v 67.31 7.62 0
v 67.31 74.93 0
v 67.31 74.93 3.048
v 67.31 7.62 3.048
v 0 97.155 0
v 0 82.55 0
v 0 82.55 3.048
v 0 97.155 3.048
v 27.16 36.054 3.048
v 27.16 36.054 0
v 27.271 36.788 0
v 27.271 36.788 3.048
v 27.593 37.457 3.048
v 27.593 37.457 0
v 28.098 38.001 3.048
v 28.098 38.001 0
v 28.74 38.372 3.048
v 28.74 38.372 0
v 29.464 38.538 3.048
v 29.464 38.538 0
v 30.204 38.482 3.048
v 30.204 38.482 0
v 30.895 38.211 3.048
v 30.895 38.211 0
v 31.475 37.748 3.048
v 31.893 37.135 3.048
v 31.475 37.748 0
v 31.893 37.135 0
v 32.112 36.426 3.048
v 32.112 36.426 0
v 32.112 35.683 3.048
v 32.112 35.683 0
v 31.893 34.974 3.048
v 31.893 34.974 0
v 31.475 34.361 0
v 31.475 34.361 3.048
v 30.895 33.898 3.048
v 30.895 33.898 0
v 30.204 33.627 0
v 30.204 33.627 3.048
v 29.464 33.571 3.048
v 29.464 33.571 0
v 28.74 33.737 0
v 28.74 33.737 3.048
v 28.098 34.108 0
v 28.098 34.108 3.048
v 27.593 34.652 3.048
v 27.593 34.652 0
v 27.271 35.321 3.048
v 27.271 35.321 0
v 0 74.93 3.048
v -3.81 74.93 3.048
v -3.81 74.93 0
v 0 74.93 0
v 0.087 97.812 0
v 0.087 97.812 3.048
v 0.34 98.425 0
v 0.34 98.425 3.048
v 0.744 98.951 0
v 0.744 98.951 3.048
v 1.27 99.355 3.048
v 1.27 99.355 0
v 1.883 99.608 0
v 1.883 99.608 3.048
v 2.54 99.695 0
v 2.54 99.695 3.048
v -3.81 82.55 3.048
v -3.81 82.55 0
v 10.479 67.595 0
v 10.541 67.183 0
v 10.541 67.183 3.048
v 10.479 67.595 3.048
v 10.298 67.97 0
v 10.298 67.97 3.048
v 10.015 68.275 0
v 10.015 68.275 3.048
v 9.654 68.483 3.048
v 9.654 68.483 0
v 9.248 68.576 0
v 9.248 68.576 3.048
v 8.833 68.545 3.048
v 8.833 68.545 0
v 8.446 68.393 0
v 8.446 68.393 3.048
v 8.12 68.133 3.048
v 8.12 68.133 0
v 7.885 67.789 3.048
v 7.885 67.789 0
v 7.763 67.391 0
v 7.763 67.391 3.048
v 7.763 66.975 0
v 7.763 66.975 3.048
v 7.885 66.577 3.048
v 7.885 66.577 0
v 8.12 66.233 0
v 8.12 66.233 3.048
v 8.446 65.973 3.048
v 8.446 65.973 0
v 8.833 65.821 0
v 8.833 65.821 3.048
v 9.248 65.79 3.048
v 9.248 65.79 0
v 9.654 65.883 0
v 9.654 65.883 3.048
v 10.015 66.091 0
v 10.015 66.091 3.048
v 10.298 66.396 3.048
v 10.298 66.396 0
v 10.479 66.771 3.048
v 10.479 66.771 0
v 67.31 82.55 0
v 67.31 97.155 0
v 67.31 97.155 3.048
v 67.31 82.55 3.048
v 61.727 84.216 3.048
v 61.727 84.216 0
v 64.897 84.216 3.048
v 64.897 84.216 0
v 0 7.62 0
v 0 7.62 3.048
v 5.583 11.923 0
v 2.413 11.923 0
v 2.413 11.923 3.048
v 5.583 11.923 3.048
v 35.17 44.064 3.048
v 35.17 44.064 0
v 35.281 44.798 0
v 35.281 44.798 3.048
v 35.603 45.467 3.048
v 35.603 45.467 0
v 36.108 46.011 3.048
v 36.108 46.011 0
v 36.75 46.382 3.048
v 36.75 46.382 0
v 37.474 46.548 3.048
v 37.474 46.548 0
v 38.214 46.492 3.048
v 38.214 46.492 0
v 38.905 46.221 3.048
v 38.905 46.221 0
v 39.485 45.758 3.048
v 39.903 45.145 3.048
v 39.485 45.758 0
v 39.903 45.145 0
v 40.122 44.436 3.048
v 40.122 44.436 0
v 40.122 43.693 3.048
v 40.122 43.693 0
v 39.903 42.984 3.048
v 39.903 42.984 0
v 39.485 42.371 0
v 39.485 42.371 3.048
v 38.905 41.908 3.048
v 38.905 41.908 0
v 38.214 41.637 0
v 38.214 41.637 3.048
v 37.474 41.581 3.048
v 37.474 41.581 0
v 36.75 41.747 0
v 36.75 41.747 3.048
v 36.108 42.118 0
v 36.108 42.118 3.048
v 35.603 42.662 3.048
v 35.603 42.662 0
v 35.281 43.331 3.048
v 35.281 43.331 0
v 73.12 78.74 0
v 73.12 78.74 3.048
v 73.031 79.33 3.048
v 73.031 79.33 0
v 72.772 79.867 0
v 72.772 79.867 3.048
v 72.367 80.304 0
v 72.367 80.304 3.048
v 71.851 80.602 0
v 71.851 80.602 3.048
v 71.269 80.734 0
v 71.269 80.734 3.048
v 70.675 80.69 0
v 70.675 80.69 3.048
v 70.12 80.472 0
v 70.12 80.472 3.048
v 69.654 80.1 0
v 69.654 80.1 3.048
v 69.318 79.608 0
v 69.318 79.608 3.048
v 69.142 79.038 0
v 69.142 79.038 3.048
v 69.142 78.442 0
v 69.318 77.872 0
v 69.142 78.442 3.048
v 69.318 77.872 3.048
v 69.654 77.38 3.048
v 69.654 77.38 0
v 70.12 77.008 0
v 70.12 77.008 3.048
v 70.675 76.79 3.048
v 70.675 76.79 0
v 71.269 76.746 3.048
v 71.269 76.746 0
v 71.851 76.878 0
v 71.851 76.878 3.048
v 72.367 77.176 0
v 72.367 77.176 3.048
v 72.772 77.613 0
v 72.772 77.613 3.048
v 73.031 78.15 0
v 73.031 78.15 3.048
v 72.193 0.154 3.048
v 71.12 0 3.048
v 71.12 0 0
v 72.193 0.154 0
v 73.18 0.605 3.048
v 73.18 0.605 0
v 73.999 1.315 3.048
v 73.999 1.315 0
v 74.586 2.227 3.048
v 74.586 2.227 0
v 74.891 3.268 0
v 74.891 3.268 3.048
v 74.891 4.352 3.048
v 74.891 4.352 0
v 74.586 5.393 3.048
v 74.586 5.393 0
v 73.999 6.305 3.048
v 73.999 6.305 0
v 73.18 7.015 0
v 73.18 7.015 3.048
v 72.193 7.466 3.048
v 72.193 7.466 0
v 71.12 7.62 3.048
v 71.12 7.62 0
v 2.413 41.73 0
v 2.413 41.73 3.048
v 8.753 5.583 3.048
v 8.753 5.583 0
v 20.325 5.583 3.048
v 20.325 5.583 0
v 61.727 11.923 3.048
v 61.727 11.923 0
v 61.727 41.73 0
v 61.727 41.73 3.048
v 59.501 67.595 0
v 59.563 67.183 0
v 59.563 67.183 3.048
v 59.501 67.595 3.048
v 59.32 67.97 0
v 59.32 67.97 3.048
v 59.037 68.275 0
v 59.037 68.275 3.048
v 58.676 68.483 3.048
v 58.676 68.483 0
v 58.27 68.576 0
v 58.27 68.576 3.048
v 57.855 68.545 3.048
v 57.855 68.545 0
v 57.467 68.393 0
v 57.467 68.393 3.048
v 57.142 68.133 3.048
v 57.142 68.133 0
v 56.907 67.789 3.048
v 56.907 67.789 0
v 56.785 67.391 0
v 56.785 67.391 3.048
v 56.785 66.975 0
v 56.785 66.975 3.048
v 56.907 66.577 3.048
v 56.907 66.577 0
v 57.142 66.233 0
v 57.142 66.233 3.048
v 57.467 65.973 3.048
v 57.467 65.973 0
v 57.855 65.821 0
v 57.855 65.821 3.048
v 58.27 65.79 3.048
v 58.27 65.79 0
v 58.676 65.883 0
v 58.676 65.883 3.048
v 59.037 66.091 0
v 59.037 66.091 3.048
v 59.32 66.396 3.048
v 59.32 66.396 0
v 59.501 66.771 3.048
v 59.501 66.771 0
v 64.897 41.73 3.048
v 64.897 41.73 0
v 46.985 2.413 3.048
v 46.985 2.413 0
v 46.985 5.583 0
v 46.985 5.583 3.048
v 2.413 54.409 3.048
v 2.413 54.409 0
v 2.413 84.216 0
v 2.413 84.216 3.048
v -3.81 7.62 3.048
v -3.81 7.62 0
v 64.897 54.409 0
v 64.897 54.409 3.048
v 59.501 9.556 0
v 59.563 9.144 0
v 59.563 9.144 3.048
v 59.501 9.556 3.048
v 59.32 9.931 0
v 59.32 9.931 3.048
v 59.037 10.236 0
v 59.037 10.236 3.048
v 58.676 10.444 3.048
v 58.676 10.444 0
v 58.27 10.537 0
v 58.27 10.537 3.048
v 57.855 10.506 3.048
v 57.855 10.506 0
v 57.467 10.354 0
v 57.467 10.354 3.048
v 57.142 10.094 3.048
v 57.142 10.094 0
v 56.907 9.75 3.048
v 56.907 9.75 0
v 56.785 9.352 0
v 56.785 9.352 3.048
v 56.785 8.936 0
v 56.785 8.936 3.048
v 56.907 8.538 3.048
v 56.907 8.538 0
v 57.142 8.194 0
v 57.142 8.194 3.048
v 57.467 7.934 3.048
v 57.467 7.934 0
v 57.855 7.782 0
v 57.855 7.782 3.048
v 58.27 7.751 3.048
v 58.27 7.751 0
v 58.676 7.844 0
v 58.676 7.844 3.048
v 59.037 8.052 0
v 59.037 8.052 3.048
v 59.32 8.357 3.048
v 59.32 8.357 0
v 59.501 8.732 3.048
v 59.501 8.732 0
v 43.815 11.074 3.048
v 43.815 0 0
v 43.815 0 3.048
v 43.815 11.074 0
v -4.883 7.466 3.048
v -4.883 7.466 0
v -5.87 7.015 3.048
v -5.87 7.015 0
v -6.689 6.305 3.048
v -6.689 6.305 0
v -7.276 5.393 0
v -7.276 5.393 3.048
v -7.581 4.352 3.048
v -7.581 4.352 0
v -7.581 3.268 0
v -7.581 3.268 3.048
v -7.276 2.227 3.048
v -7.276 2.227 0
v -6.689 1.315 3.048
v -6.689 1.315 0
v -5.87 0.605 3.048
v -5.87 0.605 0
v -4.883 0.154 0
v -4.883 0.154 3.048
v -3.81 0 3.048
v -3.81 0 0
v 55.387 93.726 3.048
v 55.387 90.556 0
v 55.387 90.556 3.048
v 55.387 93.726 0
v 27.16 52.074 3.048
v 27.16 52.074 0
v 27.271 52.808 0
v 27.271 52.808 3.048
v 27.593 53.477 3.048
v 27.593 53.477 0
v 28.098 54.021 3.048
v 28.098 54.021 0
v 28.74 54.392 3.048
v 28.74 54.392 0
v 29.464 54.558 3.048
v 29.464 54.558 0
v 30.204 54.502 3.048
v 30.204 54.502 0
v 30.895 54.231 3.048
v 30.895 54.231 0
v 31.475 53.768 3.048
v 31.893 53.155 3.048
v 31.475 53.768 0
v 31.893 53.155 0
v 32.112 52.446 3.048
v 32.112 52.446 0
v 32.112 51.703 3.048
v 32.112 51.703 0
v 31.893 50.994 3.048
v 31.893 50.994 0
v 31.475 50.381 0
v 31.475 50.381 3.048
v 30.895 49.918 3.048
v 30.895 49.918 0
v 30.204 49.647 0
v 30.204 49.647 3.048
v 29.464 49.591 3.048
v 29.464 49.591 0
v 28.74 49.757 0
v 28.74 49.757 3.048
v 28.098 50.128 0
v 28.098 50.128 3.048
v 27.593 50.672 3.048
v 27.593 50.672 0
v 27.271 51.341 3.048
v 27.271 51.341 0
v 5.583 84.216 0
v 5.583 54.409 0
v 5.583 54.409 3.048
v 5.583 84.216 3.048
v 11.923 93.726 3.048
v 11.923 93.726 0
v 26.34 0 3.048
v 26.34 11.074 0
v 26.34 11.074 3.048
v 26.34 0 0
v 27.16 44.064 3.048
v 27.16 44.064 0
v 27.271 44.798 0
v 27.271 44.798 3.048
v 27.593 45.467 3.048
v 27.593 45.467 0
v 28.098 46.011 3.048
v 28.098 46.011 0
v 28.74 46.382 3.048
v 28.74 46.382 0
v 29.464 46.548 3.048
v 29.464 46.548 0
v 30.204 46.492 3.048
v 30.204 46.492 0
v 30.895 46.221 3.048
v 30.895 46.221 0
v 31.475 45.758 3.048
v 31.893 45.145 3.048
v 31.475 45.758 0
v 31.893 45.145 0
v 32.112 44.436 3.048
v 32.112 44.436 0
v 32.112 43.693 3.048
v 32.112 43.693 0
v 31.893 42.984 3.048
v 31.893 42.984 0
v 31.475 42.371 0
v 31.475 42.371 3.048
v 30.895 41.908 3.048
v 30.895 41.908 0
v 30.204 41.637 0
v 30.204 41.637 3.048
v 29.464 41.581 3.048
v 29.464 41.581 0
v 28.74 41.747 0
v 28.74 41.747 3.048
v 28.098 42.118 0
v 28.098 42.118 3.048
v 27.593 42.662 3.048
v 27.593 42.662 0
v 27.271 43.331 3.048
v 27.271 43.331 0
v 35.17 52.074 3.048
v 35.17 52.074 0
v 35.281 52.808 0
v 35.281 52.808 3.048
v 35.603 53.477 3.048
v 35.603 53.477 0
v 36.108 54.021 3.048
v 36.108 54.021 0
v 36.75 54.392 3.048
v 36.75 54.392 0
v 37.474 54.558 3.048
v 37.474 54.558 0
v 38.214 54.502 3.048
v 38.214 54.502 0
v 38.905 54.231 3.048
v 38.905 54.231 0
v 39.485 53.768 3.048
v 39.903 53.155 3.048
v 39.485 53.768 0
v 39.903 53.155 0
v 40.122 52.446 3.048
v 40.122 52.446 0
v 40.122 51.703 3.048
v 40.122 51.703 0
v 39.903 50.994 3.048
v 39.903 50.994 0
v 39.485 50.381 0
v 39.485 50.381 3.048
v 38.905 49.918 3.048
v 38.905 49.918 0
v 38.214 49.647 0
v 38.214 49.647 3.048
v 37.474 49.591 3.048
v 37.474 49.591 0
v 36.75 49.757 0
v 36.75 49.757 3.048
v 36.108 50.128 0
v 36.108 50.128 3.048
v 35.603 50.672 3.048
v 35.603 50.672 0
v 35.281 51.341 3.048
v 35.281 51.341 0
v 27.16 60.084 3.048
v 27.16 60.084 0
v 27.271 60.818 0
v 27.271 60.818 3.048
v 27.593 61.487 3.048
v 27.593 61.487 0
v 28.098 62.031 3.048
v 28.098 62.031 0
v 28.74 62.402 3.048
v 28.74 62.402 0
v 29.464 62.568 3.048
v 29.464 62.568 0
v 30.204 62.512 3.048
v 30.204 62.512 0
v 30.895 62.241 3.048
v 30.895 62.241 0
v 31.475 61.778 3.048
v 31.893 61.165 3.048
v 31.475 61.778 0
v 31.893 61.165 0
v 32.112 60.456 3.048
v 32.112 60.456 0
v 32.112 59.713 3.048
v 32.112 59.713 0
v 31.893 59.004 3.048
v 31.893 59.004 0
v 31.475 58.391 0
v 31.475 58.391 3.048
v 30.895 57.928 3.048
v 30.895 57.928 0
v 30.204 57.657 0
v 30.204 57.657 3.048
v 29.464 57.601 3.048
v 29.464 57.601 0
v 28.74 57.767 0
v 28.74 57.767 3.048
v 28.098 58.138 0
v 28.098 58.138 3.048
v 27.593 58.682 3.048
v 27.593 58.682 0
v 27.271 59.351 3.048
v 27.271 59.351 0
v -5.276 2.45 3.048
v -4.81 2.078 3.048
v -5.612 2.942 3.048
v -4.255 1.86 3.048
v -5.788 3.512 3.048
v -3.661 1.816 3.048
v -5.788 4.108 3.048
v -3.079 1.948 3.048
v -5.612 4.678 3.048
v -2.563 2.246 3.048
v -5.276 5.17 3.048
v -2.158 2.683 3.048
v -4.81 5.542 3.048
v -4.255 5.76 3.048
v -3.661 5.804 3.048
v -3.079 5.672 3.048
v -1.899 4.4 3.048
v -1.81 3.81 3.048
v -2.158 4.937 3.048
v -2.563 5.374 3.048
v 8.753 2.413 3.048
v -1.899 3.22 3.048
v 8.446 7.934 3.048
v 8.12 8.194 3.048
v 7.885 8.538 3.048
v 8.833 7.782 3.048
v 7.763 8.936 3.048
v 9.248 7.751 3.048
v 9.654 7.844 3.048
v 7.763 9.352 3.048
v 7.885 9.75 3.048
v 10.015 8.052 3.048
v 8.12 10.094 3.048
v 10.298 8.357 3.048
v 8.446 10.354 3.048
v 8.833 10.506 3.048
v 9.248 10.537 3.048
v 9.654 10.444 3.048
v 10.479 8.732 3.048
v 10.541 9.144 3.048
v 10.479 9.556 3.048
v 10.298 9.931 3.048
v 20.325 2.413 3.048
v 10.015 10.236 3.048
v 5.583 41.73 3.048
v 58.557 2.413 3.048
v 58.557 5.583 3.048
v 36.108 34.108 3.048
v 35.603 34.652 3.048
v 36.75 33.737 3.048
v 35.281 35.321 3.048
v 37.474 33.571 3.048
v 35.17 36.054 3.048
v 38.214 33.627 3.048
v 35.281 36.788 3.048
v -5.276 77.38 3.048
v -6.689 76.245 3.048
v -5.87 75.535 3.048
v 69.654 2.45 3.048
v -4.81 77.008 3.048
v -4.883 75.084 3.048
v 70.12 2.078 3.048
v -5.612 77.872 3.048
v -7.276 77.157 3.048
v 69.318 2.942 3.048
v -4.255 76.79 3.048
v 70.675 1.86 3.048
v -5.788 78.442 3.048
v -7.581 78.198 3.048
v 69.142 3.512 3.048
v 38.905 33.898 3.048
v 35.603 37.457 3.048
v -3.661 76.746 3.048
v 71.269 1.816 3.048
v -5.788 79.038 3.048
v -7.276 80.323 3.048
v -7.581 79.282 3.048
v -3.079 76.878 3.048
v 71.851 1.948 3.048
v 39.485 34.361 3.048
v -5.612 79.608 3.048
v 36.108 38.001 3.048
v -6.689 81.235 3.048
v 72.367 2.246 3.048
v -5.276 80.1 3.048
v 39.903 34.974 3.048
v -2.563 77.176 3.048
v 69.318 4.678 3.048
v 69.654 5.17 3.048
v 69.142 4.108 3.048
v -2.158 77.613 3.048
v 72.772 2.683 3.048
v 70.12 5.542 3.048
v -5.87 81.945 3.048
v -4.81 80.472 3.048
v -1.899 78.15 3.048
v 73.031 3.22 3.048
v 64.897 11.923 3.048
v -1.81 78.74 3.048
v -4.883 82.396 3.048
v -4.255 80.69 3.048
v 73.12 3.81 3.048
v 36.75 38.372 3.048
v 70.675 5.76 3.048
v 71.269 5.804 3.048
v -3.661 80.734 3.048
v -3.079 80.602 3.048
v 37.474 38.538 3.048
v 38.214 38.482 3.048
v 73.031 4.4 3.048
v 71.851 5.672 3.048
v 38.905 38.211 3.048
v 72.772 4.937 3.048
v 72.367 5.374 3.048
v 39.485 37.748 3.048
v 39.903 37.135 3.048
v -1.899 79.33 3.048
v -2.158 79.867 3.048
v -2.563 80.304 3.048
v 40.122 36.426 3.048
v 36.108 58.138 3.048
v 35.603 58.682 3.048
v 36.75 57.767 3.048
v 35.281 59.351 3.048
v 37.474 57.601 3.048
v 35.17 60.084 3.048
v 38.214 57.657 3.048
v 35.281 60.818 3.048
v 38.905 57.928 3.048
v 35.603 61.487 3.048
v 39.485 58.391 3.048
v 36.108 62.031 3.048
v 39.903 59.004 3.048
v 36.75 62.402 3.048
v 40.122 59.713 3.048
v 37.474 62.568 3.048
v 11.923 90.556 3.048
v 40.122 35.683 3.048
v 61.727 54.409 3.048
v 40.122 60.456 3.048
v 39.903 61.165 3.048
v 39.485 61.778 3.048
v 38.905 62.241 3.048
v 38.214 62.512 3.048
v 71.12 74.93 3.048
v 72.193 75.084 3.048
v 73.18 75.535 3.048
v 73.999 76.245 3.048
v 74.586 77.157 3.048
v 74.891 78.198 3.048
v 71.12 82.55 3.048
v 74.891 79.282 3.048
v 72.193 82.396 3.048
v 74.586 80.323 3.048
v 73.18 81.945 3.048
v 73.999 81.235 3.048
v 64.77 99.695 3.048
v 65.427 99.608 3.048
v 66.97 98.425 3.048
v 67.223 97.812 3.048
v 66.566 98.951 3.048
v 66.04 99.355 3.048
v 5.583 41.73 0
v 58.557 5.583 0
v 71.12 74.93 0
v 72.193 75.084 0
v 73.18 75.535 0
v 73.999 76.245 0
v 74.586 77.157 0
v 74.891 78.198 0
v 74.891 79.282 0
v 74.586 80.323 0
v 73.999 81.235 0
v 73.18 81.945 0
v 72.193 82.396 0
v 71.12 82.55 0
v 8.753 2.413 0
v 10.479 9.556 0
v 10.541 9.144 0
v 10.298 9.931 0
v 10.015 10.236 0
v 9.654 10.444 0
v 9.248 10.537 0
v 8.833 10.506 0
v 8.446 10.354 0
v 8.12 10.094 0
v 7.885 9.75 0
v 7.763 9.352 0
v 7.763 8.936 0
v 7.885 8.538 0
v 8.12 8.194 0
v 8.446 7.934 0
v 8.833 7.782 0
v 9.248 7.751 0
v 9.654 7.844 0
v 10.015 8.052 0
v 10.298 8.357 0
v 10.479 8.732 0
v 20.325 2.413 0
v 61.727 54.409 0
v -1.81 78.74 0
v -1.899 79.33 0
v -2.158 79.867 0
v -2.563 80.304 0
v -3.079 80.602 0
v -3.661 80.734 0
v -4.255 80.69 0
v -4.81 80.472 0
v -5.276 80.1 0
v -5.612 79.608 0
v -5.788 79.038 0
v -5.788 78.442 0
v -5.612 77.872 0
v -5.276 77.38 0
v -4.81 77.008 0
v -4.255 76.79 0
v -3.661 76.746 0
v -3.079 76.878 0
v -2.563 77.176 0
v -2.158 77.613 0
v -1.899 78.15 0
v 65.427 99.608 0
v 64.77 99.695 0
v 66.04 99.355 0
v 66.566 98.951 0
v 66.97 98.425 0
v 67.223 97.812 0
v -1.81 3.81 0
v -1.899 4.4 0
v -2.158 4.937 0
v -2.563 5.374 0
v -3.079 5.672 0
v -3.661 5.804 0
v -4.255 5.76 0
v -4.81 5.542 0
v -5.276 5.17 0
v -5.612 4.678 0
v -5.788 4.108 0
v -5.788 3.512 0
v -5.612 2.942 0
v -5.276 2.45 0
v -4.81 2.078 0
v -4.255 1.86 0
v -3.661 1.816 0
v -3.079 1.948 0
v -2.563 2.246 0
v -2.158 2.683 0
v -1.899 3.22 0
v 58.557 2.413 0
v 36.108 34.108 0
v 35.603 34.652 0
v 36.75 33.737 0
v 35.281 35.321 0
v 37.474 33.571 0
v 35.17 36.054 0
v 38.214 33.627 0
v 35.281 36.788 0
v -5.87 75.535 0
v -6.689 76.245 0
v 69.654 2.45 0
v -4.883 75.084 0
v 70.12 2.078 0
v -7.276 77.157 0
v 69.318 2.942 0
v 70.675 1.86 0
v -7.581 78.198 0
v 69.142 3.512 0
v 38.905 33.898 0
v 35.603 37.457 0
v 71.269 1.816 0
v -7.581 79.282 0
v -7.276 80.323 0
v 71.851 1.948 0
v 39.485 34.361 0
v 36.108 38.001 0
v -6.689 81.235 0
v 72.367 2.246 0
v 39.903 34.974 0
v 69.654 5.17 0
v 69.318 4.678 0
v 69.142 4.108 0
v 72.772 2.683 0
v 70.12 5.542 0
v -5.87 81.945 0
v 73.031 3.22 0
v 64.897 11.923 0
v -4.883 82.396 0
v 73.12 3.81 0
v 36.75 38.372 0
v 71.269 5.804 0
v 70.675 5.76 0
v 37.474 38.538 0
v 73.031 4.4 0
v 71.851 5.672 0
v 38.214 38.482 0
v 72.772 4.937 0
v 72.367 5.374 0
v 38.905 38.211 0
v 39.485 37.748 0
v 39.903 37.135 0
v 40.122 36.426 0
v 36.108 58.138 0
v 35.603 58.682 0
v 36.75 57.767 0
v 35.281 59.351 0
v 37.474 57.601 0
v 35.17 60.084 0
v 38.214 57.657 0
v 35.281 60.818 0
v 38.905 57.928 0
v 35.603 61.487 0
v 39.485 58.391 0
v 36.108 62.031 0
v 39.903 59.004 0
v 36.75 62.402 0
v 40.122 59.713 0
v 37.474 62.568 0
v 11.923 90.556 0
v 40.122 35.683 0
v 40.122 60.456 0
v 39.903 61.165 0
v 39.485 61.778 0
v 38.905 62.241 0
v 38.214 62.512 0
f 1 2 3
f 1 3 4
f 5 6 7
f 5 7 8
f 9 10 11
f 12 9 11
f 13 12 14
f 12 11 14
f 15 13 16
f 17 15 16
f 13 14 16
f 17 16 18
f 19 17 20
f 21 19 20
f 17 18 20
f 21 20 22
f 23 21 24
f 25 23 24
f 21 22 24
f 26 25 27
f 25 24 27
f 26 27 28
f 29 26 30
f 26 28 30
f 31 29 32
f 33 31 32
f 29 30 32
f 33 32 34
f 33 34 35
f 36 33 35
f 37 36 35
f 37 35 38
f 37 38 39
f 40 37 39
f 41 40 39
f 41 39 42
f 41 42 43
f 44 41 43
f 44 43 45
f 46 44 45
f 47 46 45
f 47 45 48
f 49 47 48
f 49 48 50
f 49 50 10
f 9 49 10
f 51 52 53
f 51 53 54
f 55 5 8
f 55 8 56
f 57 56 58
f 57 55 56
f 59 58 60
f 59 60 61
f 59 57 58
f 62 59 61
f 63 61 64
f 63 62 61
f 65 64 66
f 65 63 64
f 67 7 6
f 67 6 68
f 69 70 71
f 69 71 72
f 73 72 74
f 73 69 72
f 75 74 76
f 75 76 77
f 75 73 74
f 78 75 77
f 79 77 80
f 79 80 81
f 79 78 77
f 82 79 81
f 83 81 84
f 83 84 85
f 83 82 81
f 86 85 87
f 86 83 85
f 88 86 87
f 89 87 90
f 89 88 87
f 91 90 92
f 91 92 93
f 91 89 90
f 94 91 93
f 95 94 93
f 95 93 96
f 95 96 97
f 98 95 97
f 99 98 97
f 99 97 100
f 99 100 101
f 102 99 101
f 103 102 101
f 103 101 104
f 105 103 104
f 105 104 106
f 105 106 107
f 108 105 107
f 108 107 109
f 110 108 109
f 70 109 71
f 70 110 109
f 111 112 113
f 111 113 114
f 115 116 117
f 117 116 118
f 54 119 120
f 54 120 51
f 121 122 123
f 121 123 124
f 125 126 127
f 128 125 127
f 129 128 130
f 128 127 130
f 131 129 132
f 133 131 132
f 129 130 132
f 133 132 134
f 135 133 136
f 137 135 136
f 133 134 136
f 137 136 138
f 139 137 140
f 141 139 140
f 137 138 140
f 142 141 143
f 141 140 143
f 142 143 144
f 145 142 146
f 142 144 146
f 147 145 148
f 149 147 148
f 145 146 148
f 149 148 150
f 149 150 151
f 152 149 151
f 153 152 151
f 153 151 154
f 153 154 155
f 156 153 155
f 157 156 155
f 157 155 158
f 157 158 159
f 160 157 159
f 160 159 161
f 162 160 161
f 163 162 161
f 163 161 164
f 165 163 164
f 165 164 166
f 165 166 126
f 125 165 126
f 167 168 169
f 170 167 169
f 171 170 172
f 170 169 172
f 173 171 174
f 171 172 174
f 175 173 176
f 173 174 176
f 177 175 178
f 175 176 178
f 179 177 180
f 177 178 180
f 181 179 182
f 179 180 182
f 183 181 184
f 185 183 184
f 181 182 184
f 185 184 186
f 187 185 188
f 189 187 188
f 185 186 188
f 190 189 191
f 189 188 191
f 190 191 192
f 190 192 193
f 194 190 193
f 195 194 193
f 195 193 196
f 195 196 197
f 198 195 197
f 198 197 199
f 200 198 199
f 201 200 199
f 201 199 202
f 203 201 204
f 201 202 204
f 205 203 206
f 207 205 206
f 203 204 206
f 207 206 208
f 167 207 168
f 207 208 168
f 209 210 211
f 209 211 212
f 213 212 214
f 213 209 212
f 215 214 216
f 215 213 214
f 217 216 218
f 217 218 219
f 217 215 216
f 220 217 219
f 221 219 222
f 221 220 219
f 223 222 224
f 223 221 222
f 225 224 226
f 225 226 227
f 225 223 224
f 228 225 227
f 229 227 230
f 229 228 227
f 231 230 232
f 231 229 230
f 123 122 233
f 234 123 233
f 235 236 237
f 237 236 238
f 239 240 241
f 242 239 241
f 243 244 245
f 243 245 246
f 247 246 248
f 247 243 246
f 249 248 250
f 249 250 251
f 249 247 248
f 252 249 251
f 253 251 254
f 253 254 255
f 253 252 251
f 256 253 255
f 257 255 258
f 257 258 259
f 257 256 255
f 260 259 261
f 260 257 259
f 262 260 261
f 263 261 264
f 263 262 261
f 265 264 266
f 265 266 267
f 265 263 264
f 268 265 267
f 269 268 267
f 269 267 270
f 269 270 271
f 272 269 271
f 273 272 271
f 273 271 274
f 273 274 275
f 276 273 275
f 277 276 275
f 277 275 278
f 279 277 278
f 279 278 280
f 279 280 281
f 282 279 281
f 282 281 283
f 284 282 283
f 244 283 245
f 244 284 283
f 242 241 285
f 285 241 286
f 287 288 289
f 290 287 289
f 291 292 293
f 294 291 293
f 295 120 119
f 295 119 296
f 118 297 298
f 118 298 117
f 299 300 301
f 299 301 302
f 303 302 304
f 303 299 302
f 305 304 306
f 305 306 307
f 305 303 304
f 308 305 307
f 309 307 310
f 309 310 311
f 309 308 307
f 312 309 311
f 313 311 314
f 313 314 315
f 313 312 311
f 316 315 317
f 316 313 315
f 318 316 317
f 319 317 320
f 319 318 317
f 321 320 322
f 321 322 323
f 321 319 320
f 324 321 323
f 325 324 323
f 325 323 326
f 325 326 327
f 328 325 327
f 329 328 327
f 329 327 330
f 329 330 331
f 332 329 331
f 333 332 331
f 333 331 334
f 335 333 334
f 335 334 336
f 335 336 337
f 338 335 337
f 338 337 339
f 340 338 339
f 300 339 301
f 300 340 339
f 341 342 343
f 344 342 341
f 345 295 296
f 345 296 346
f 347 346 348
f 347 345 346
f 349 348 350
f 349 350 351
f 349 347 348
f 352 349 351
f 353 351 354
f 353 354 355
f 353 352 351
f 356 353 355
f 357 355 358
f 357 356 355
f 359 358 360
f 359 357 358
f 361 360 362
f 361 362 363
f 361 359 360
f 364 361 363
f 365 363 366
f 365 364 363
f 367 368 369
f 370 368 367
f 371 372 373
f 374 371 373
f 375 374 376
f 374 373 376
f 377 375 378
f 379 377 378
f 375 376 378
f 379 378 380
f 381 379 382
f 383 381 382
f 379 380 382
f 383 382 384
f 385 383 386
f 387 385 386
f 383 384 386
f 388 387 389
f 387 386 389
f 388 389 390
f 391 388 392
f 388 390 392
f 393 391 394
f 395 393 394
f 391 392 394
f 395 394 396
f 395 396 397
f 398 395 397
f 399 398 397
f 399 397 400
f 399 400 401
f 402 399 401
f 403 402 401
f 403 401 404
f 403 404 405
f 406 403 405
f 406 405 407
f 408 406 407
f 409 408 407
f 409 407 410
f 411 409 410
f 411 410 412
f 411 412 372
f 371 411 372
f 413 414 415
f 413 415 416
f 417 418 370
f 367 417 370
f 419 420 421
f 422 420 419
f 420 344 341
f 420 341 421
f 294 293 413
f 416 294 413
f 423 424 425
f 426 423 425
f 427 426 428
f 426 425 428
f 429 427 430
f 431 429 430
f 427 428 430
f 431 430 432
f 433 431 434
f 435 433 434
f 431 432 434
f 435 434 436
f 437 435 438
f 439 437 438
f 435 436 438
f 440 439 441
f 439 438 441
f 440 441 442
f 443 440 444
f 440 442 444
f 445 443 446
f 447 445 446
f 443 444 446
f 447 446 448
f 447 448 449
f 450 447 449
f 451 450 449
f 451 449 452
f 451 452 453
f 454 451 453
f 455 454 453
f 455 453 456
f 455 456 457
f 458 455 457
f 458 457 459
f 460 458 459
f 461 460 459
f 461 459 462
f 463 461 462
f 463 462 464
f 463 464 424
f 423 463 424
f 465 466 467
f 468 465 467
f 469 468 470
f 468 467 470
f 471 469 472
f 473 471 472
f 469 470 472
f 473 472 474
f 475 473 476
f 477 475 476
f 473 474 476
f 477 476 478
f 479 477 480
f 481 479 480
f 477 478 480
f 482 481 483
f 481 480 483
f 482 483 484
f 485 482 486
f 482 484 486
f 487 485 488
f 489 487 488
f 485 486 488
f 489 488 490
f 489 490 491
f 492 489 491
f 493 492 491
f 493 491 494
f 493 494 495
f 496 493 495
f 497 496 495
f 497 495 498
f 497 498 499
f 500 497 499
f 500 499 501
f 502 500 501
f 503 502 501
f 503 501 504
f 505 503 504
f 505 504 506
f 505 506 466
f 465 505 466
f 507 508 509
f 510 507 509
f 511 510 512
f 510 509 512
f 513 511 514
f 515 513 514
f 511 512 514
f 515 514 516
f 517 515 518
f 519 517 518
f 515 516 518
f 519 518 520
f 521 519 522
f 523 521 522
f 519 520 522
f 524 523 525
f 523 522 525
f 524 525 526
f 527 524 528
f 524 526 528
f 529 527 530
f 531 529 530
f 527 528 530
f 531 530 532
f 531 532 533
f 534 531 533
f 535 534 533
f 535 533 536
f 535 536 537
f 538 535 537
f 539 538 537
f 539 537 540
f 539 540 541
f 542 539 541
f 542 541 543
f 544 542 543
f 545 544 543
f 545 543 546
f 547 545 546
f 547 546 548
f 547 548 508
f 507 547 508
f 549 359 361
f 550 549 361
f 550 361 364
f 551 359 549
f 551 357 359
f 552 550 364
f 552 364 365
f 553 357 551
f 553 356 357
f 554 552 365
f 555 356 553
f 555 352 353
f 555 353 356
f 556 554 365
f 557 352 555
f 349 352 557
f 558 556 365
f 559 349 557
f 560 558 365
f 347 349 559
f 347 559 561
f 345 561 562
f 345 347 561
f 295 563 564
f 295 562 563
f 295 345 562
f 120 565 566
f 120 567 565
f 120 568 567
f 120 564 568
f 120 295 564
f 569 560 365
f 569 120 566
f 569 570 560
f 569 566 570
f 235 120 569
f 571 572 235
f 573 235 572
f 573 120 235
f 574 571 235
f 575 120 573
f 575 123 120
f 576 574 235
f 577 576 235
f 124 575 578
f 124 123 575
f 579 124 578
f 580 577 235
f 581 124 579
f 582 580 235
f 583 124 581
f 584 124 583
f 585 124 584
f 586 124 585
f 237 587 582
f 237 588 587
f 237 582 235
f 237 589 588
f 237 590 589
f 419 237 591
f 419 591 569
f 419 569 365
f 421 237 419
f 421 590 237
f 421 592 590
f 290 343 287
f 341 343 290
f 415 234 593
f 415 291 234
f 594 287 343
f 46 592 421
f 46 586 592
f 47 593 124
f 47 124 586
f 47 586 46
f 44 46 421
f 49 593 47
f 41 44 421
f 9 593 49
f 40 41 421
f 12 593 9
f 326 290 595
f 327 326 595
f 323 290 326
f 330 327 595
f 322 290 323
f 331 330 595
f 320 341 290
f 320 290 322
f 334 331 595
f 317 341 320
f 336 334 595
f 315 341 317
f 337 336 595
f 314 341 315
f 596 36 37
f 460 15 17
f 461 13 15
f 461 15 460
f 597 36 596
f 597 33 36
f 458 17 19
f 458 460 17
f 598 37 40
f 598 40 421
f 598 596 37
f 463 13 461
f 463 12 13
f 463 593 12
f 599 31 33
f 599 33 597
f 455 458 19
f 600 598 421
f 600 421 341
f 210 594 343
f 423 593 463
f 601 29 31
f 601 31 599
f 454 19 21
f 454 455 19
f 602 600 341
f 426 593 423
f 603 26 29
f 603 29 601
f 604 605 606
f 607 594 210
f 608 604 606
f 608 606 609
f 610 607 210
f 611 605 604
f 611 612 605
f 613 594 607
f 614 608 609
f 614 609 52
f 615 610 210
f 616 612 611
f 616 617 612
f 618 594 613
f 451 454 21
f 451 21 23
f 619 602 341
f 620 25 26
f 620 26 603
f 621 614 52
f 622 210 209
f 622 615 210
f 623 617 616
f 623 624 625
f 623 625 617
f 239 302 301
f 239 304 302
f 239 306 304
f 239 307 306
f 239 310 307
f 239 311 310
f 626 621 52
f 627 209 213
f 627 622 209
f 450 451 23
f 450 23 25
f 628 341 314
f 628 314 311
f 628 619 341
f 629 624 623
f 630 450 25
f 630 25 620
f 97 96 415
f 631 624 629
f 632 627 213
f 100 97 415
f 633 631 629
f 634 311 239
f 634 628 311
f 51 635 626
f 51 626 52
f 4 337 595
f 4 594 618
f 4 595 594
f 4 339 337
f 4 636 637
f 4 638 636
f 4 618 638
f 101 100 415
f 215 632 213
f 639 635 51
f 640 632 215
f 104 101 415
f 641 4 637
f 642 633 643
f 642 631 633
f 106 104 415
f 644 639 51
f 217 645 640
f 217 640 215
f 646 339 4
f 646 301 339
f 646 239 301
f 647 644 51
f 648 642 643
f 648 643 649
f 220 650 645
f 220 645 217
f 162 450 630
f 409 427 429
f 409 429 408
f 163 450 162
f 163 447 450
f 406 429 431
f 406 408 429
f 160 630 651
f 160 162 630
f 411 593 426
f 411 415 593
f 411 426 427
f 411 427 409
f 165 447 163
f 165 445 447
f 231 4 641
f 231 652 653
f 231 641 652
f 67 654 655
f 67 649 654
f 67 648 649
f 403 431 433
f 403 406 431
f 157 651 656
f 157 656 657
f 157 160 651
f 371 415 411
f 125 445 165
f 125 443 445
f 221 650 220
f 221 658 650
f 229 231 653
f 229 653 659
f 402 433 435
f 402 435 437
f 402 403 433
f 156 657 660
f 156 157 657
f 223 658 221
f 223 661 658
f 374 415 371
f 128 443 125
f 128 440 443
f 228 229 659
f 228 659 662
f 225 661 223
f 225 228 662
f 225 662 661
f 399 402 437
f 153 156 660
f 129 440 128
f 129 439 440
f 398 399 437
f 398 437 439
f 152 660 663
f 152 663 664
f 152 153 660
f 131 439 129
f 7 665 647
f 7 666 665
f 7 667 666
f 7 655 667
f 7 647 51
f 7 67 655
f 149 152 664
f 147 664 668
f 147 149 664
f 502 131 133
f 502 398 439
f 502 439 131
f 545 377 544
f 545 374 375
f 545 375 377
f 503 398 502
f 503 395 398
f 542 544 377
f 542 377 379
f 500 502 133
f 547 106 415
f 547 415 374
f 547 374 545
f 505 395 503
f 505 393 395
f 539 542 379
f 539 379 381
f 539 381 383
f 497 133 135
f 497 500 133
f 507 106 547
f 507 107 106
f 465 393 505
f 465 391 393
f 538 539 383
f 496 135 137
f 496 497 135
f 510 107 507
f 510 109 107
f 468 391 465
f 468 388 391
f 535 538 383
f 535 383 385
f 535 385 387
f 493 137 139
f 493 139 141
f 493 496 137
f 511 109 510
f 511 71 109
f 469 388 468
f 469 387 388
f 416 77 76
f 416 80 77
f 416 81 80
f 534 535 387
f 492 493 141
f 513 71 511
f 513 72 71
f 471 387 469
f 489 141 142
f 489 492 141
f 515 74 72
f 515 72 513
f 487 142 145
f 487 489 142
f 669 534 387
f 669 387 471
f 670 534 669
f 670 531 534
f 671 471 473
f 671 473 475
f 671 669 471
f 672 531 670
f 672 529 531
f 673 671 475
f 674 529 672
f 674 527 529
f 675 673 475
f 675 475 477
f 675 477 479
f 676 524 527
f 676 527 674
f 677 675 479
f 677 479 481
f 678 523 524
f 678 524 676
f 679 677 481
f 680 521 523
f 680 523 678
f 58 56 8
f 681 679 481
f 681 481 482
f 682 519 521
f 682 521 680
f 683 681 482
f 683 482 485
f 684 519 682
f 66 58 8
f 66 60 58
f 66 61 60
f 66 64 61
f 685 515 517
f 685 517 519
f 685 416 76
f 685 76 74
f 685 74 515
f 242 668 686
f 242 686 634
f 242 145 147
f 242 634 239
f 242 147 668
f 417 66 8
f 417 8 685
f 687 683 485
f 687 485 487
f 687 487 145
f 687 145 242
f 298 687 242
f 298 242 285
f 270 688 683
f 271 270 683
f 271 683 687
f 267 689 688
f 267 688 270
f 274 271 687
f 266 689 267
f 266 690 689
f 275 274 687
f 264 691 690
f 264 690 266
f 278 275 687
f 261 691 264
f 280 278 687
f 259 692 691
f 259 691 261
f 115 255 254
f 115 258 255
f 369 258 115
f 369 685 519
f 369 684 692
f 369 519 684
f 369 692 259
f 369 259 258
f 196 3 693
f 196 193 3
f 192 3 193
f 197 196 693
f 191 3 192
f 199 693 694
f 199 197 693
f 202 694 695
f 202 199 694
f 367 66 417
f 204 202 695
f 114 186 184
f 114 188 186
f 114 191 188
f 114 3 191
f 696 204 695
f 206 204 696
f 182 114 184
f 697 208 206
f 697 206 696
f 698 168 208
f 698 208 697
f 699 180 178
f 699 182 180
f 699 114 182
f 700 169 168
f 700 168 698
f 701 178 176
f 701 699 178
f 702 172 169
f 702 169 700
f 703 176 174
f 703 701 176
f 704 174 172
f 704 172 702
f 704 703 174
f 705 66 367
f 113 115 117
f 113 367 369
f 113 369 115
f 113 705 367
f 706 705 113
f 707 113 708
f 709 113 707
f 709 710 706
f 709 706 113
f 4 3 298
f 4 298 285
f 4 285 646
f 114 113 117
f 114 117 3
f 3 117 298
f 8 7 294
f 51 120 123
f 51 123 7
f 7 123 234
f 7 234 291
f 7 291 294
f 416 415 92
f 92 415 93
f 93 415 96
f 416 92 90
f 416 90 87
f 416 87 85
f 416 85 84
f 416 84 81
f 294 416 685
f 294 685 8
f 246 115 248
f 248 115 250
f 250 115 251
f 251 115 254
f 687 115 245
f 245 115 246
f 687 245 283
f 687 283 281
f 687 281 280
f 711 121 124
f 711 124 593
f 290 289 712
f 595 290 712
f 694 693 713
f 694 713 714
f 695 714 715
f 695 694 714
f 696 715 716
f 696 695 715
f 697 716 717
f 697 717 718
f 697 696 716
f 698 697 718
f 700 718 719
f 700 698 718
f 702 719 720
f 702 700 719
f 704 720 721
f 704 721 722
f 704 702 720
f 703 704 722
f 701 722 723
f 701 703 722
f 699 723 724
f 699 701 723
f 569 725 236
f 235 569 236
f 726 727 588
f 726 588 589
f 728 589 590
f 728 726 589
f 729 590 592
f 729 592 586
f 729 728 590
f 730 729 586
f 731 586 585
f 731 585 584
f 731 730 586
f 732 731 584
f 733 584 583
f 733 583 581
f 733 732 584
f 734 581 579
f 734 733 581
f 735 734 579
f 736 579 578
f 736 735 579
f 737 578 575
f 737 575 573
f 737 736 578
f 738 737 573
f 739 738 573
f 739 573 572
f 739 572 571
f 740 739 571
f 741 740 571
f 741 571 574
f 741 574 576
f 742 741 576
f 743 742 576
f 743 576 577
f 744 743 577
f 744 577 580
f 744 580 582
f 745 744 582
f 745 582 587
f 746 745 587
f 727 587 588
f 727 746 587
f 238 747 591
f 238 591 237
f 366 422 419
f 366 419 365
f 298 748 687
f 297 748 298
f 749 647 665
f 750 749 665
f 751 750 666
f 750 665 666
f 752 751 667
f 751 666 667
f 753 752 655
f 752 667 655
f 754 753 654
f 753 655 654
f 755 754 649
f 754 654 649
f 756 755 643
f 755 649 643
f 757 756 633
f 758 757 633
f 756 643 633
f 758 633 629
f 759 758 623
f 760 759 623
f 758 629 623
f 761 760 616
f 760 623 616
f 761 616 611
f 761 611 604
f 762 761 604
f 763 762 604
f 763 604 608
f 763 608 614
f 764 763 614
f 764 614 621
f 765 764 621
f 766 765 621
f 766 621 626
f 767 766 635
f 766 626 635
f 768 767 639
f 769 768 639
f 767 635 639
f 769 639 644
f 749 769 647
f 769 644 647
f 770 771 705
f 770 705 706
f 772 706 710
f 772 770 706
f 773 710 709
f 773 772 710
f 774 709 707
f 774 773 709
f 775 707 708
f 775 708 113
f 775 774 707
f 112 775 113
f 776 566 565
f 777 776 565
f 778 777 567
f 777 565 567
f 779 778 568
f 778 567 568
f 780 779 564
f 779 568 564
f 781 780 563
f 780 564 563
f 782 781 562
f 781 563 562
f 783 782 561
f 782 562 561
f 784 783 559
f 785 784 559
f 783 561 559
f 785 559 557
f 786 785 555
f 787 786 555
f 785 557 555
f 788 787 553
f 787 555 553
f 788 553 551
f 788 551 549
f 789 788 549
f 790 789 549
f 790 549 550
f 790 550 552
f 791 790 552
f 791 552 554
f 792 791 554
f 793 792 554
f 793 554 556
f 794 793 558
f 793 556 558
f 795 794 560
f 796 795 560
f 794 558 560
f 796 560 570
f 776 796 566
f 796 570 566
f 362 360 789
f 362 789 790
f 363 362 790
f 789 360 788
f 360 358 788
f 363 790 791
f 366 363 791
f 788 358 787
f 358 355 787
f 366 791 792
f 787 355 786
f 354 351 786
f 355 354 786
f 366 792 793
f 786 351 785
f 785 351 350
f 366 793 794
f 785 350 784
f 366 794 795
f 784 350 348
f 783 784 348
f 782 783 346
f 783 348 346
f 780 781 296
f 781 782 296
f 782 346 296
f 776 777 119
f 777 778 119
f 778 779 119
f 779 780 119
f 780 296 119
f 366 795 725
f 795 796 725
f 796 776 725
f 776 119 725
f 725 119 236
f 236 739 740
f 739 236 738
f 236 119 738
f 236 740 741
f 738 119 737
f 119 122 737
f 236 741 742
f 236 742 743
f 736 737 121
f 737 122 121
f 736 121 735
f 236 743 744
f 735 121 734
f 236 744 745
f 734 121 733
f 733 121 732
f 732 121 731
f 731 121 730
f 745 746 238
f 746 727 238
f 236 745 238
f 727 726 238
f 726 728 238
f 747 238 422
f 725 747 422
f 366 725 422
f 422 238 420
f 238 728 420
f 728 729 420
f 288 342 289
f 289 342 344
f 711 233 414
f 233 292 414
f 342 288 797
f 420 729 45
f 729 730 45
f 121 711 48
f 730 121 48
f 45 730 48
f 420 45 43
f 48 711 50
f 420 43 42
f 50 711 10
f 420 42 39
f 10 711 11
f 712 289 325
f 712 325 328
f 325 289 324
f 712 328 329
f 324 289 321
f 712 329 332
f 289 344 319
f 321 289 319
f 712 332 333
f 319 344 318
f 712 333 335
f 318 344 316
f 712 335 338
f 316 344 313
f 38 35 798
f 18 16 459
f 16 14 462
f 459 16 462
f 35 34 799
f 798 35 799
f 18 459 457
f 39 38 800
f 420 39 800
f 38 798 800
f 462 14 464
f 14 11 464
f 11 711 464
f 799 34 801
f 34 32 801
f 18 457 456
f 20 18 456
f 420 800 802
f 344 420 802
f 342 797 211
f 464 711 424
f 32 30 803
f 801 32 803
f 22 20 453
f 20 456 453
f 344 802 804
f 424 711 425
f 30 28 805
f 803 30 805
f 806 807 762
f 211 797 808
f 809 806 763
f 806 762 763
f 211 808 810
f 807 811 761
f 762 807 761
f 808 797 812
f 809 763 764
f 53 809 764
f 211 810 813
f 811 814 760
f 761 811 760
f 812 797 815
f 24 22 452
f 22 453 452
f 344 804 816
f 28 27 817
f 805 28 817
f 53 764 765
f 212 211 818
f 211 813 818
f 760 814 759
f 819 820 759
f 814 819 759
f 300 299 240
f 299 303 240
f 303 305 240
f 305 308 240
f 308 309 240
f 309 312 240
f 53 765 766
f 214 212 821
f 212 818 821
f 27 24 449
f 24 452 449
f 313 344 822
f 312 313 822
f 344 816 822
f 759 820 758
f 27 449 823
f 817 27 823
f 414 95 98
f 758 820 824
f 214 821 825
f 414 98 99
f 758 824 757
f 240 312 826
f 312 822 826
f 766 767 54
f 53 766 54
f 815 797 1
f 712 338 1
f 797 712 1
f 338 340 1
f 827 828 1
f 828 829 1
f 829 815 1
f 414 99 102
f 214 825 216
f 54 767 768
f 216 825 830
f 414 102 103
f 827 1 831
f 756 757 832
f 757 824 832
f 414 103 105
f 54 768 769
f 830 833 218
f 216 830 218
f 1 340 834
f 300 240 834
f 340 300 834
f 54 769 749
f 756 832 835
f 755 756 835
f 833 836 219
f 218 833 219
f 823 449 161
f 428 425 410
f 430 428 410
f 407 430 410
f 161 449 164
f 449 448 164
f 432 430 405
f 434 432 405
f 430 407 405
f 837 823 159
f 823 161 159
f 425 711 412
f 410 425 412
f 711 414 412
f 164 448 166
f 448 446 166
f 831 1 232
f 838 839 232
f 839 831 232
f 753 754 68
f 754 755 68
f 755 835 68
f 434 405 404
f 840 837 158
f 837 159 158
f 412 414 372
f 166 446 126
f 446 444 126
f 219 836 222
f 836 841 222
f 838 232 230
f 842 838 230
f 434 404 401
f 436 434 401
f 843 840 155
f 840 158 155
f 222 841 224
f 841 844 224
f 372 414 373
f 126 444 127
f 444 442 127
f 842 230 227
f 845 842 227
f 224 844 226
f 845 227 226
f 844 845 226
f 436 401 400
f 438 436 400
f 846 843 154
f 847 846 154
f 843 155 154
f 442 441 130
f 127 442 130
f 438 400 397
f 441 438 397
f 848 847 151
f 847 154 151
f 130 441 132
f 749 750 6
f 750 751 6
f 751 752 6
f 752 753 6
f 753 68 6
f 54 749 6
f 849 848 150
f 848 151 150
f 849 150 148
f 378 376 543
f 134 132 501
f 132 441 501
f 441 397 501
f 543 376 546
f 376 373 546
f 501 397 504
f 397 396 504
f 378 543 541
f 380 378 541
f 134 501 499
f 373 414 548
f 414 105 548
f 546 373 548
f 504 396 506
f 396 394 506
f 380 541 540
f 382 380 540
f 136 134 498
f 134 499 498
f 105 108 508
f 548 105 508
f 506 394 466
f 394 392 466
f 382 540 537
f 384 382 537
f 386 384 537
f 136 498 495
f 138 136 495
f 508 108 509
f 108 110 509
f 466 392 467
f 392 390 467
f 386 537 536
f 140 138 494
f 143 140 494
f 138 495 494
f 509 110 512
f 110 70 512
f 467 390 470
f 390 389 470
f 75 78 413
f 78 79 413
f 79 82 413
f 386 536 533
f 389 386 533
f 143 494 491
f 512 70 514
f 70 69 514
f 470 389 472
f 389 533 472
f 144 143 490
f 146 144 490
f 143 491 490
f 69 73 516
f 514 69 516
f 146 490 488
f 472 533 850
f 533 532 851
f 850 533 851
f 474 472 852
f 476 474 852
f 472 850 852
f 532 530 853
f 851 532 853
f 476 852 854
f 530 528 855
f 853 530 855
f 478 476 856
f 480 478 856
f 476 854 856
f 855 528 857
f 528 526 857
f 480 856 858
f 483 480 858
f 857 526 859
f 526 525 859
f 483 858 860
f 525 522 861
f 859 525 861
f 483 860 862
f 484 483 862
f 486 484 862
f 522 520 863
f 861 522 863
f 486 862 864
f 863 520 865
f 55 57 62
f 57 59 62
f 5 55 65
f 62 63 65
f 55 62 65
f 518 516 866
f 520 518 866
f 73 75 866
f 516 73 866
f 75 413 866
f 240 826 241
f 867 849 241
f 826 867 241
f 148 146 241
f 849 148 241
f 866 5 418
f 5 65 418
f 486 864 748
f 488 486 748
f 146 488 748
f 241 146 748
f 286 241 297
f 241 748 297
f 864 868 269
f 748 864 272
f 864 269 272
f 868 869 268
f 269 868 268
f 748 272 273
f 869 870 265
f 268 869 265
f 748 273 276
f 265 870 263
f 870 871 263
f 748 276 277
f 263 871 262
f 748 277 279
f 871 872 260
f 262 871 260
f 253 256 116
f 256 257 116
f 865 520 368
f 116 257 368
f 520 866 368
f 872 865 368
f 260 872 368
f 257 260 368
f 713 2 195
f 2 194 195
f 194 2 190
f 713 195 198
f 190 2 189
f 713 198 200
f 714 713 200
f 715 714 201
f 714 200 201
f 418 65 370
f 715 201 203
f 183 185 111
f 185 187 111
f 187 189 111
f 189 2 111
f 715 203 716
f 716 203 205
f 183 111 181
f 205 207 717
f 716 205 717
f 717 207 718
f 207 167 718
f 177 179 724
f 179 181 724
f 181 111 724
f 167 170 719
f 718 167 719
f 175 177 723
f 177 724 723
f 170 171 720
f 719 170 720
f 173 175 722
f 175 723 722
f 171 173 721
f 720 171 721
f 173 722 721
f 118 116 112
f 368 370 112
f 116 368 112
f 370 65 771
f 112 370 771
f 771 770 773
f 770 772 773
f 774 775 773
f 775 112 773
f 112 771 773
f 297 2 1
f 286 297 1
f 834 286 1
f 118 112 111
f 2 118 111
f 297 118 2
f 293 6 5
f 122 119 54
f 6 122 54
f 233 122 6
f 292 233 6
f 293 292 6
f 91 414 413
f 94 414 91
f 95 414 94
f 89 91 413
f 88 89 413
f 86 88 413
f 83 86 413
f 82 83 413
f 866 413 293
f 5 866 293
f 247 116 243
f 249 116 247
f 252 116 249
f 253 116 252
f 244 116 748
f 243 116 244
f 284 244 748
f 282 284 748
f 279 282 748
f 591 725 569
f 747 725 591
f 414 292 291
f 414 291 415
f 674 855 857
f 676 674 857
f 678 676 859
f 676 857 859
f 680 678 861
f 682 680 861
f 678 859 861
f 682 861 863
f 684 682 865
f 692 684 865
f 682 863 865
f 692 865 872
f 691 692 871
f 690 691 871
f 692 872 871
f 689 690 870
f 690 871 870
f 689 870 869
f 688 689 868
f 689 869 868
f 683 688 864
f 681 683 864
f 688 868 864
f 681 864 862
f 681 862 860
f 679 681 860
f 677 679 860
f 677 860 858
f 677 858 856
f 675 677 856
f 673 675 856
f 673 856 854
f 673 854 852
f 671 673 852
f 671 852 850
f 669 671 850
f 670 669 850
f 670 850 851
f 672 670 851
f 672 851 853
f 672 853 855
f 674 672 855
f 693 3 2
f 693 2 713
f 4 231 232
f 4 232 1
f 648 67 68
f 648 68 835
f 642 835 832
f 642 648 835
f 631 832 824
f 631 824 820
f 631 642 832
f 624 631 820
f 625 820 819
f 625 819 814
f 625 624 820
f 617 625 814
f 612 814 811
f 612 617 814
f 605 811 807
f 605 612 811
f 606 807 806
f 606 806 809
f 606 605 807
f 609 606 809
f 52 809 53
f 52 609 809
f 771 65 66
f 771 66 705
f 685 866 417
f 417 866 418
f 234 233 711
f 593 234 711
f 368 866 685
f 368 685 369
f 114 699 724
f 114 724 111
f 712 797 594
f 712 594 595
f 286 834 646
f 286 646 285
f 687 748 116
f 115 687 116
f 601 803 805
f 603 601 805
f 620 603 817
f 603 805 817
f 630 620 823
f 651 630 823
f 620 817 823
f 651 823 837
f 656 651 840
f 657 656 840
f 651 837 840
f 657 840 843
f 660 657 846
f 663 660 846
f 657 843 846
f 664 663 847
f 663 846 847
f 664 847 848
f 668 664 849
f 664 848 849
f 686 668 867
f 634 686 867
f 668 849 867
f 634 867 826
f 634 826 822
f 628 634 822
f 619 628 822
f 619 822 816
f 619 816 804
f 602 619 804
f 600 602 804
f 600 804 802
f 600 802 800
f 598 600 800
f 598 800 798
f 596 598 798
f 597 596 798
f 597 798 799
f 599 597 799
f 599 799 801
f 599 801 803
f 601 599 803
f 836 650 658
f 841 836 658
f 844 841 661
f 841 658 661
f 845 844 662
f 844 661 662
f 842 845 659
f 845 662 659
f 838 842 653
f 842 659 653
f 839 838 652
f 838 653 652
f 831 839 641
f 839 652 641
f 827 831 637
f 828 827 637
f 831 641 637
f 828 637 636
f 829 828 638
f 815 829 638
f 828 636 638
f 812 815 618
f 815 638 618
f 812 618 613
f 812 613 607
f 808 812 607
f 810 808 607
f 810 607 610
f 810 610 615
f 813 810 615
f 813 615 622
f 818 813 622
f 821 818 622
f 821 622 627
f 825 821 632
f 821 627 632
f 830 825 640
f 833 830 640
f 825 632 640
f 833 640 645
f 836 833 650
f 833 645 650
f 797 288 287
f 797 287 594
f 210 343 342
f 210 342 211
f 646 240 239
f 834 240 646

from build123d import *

# Parameters (mm, degrees)
MODEL_R             = 1.397
MODEL_W             = 11.572
MODEL_H             = 3.17
MODEL_W_2           = 3.17
MODEL_H_2           = 29.8065
MODEL_W_3           = 43.464000078
BOSS_EXTRUDE1_DEPTH = 3.048
SKETCH2_R           = 3.810000039
SKETCH2_R_2         = 2
SKETCH2_R_3         = 3.809999961
BOSS_EXTRUDE2_DEPTH = 3.048
SKETCH3_R           = 2.49
CUT_EXTRUDE1_DEPTH  = 4.048


with BuildPart() as part:
    # Model → Boss-Extrude1 (new body)
    with BuildSketch(Plane.XY):
        with BuildLine():
            Line((26.3398, 0), (2.54, 0))
            ThreePointArc((2.54, 0), (0.743948776, 0.743948776), (0, 2.54))
            Line((0, 2.54), (0, 97.154990539))
            ThreePointArc((0, 97.154990539), (0.743948776, 98.951041763), (2.54, 99.694990539))
            Line((2.54, 99.694990539), (64.77, 99.694990539))
            ThreePointArc((64.77, 99.694990539), (66.566051224, 98.951041763), (67.31, 97.154990539))
            Line((67.31, 97.154990539), (67.31, 2.54))
            ThreePointArc((67.31, 2.54), (66.566051224, 0.743948776), (64.77, 0))
            Line((64.77, 0), (43.815, 0))
            Line((43.815, 0), (43.815, 11.0744))
            Line((43.815, 11.0744), (26.3398, 11.0744))
            Line((26.3398, 11.0744), (26.3398, 0))
        make_face()
        with Locations((9.144, 9.144)):
            Circle(MODEL_R, mode=Mode.SUBTRACT)
        with Locations((58.166, 9.144)):
            Circle(MODEL_R, mode=Mode.SUBTRACT)
        with Locations((9.144, 67.183)):
            Circle(MODEL_R, mode=Mode.SUBTRACT)
        with Locations((58.166, 67.183)):
            Circle(MODEL_R, mode=Mode.SUBTRACT)
        with Locations((52.771, 3.998)):
            Rectangle(MODEL_W, MODEL_H, mode=Mode.SUBTRACT)
        with Locations((63.312, 26.82625)):
            Rectangle(MODEL_W_2, MODEL_H_2, mode=Mode.SUBTRACT)
        with Locations((63.312, 69.31275)):
            Rectangle(MODEL_W_2, MODEL_H_2, mode=Mode.SUBTRACT)
        with Locations((33.654999961, 92.141)):
            Rectangle(MODEL_W_3, MODEL_H, mode=Mode.SUBTRACT)
        with Locations((3.997999922, 69.31275)):
            Rectangle(MODEL_W_2, MODEL_H_2, mode=Mode.SUBTRACT)
        with Locations((3.997999922, 26.82625)):
            Rectangle(MODEL_W_2, MODEL_H_2, mode=Mode.SUBTRACT)
        with Locations((14.538999922, 3.998)):
            Rectangle(MODEL_W, MODEL_H, mode=Mode.SUBTRACT)
    extrude(amount=BOSS_EXTRUDE1_DEPTH)

    # Sketch2 → Boss-Extrude2 (add)
    with BuildSketch(Plane.XY.offset(3.048)):
        with BuildLine():
            Line((-3.810000039, 74.929999922), (0, 74.929999922))
            Line((0, 74.929999922), (0, 78.739999961))
            ThreePointArc((0, 78.739999961), (-1.115923175, 76.045923097), (-3.810000039, 74.929999922))
        make_face()
        with Locations((-3.810000039, 78.739999961)):
            Circle(SKETCH2_R)
        with Locations((-3.810000039, 78.739999961)):
            Circle(SKETCH2_R_2, mode=Mode.SUBTRACT)
        with BuildLine():
            ThreePointArc((-3.810000039, 82.55), (-1.115923175, 81.434076825), (0, 78.739999961))
            Line((0, 78.739999961), (0, 82.55))
            Line((0, 82.55), (-3.810000039, 82.55))
        make_face()
        with BuildLine():
            Line((67.31, 78.739999961), (67.31, 74.929999922))
            Line((67.31, 74.929999922), (71.119999961, 74.929999922))
            ThreePointArc((71.119999961, 74.929999922), (68.425923097, 76.045923097), (67.309999922, 78.739999961))
        make_face()
        with BuildLine():
            Line((67.31, 82.55), (67.31, 78.739999961))
            ThreePointArc((67.309999922, 78.739999961), (68.425923097, 81.434076825), (71.119999961, 82.55))
            Line((71.119999961, 82.55), (67.31, 82.55))
        make_face()
        with BuildLine():
            ThreePointArc((67.31, 2.54), (66.566051224, 0.743948776), (64.77, 0))
            Line((64.77, 0), (71.119999961, 0))
            ThreePointArc((71.119999961, 0), (68.425923152, 1.115923152), (67.31, 3.809999961))
            Line((67.31, 3.809999961), (67.31, 2.54))
        make_face()
        with Locations((71.119999961, 3.809999961)):
            Circle(SKETCH2_R_3)
        with Locations((71.119999961, 3.809999961)):
            Circle(SKETCH2_R_2, mode=Mode.SUBTRACT)
        with BuildLine():
            Line((67.31, 7.619999922), (67.31, 3.809999961))
            ThreePointArc((67.31, 3.809999961), (68.425923152, 6.50407677), (71.119999961, 7.619999922))
            Line((71.119999961, 7.619999922), (67.31, 7.619999922))
        make_face()
        with BuildLine():
            ThreePointArc((-7.8e-08, 3.809999961), (-1.11592323, 1.115923152), (-3.810000039, 0))
            Line((-3.810000039, 0), (2.54, 0))
            ThreePointArc((2.54, 0), (0.743948776, 0.743948776), (0, 2.54))
            Line((0, 2.54), (0, 3.809999961))
        make_face()
        with Locations((-3.810000039, 3.809999961)):
            Circle(SKETCH2_R_3)
        with Locations((-3.810000039, 3.809999961)):
            Circle(SKETCH2_R_2, mode=Mode.SUBTRACT)
        with BuildLine():
            Line((0, 7.619999922), (-3.810000039, 7.619999922))
            ThreePointArc((-3.810000039, 7.619999922), (-1.11592323, 6.50407677), (-7.8e-08, 3.809999961))
            Line((0, 3.809999961), (0, 7.619999922))
        make_face()
        with Locations((71.119999961, 78.739999961)):
            Circle(SKETCH2_R)
        with Locations((71.119999961, 78.739999961)):
            Circle(SKETCH2_R_2, mode=Mode.SUBTRACT)
    extrude(amount=-BOSS_EXTRUDE2_DEPTH)

    # Sketch3 → Cut-Extrude1 (cut, through all)
    with BuildSketch(Plane(origin=(0, 0, 0), x_dir=(-1, 0, 0), z_dir=(0, 0, -1))):
        with Locations((-29.649999961, 60.0845)):
            Circle(SKETCH3_R)
        with Locations((-37.659999961, 60.0845)):
            Circle(SKETCH3_R)
        with Locations((-37.659999961, 52.0745)):
            Circle(SKETCH3_R)
        with Locations((-29.649999961, 52.0745)):
            Circle(SKETCH3_R)
        with Locations((-29.649999961, 44.0645)):
            Circle(SKETCH3_R)
        with Locations((-37.659999961, 44.0645)):
            Circle(SKETCH3_R)
        with Locations((-29.649999961, 36.0545)):
            Circle(SKETCH3_R)
        with Locations((-37.659999961, 36.0545)):
            Circle(SKETCH3_R)
    extrude(amount=-CUT_EXTRUDE1_DEPTH, mode=Mode.SUBTRACT)


solid = part.part
